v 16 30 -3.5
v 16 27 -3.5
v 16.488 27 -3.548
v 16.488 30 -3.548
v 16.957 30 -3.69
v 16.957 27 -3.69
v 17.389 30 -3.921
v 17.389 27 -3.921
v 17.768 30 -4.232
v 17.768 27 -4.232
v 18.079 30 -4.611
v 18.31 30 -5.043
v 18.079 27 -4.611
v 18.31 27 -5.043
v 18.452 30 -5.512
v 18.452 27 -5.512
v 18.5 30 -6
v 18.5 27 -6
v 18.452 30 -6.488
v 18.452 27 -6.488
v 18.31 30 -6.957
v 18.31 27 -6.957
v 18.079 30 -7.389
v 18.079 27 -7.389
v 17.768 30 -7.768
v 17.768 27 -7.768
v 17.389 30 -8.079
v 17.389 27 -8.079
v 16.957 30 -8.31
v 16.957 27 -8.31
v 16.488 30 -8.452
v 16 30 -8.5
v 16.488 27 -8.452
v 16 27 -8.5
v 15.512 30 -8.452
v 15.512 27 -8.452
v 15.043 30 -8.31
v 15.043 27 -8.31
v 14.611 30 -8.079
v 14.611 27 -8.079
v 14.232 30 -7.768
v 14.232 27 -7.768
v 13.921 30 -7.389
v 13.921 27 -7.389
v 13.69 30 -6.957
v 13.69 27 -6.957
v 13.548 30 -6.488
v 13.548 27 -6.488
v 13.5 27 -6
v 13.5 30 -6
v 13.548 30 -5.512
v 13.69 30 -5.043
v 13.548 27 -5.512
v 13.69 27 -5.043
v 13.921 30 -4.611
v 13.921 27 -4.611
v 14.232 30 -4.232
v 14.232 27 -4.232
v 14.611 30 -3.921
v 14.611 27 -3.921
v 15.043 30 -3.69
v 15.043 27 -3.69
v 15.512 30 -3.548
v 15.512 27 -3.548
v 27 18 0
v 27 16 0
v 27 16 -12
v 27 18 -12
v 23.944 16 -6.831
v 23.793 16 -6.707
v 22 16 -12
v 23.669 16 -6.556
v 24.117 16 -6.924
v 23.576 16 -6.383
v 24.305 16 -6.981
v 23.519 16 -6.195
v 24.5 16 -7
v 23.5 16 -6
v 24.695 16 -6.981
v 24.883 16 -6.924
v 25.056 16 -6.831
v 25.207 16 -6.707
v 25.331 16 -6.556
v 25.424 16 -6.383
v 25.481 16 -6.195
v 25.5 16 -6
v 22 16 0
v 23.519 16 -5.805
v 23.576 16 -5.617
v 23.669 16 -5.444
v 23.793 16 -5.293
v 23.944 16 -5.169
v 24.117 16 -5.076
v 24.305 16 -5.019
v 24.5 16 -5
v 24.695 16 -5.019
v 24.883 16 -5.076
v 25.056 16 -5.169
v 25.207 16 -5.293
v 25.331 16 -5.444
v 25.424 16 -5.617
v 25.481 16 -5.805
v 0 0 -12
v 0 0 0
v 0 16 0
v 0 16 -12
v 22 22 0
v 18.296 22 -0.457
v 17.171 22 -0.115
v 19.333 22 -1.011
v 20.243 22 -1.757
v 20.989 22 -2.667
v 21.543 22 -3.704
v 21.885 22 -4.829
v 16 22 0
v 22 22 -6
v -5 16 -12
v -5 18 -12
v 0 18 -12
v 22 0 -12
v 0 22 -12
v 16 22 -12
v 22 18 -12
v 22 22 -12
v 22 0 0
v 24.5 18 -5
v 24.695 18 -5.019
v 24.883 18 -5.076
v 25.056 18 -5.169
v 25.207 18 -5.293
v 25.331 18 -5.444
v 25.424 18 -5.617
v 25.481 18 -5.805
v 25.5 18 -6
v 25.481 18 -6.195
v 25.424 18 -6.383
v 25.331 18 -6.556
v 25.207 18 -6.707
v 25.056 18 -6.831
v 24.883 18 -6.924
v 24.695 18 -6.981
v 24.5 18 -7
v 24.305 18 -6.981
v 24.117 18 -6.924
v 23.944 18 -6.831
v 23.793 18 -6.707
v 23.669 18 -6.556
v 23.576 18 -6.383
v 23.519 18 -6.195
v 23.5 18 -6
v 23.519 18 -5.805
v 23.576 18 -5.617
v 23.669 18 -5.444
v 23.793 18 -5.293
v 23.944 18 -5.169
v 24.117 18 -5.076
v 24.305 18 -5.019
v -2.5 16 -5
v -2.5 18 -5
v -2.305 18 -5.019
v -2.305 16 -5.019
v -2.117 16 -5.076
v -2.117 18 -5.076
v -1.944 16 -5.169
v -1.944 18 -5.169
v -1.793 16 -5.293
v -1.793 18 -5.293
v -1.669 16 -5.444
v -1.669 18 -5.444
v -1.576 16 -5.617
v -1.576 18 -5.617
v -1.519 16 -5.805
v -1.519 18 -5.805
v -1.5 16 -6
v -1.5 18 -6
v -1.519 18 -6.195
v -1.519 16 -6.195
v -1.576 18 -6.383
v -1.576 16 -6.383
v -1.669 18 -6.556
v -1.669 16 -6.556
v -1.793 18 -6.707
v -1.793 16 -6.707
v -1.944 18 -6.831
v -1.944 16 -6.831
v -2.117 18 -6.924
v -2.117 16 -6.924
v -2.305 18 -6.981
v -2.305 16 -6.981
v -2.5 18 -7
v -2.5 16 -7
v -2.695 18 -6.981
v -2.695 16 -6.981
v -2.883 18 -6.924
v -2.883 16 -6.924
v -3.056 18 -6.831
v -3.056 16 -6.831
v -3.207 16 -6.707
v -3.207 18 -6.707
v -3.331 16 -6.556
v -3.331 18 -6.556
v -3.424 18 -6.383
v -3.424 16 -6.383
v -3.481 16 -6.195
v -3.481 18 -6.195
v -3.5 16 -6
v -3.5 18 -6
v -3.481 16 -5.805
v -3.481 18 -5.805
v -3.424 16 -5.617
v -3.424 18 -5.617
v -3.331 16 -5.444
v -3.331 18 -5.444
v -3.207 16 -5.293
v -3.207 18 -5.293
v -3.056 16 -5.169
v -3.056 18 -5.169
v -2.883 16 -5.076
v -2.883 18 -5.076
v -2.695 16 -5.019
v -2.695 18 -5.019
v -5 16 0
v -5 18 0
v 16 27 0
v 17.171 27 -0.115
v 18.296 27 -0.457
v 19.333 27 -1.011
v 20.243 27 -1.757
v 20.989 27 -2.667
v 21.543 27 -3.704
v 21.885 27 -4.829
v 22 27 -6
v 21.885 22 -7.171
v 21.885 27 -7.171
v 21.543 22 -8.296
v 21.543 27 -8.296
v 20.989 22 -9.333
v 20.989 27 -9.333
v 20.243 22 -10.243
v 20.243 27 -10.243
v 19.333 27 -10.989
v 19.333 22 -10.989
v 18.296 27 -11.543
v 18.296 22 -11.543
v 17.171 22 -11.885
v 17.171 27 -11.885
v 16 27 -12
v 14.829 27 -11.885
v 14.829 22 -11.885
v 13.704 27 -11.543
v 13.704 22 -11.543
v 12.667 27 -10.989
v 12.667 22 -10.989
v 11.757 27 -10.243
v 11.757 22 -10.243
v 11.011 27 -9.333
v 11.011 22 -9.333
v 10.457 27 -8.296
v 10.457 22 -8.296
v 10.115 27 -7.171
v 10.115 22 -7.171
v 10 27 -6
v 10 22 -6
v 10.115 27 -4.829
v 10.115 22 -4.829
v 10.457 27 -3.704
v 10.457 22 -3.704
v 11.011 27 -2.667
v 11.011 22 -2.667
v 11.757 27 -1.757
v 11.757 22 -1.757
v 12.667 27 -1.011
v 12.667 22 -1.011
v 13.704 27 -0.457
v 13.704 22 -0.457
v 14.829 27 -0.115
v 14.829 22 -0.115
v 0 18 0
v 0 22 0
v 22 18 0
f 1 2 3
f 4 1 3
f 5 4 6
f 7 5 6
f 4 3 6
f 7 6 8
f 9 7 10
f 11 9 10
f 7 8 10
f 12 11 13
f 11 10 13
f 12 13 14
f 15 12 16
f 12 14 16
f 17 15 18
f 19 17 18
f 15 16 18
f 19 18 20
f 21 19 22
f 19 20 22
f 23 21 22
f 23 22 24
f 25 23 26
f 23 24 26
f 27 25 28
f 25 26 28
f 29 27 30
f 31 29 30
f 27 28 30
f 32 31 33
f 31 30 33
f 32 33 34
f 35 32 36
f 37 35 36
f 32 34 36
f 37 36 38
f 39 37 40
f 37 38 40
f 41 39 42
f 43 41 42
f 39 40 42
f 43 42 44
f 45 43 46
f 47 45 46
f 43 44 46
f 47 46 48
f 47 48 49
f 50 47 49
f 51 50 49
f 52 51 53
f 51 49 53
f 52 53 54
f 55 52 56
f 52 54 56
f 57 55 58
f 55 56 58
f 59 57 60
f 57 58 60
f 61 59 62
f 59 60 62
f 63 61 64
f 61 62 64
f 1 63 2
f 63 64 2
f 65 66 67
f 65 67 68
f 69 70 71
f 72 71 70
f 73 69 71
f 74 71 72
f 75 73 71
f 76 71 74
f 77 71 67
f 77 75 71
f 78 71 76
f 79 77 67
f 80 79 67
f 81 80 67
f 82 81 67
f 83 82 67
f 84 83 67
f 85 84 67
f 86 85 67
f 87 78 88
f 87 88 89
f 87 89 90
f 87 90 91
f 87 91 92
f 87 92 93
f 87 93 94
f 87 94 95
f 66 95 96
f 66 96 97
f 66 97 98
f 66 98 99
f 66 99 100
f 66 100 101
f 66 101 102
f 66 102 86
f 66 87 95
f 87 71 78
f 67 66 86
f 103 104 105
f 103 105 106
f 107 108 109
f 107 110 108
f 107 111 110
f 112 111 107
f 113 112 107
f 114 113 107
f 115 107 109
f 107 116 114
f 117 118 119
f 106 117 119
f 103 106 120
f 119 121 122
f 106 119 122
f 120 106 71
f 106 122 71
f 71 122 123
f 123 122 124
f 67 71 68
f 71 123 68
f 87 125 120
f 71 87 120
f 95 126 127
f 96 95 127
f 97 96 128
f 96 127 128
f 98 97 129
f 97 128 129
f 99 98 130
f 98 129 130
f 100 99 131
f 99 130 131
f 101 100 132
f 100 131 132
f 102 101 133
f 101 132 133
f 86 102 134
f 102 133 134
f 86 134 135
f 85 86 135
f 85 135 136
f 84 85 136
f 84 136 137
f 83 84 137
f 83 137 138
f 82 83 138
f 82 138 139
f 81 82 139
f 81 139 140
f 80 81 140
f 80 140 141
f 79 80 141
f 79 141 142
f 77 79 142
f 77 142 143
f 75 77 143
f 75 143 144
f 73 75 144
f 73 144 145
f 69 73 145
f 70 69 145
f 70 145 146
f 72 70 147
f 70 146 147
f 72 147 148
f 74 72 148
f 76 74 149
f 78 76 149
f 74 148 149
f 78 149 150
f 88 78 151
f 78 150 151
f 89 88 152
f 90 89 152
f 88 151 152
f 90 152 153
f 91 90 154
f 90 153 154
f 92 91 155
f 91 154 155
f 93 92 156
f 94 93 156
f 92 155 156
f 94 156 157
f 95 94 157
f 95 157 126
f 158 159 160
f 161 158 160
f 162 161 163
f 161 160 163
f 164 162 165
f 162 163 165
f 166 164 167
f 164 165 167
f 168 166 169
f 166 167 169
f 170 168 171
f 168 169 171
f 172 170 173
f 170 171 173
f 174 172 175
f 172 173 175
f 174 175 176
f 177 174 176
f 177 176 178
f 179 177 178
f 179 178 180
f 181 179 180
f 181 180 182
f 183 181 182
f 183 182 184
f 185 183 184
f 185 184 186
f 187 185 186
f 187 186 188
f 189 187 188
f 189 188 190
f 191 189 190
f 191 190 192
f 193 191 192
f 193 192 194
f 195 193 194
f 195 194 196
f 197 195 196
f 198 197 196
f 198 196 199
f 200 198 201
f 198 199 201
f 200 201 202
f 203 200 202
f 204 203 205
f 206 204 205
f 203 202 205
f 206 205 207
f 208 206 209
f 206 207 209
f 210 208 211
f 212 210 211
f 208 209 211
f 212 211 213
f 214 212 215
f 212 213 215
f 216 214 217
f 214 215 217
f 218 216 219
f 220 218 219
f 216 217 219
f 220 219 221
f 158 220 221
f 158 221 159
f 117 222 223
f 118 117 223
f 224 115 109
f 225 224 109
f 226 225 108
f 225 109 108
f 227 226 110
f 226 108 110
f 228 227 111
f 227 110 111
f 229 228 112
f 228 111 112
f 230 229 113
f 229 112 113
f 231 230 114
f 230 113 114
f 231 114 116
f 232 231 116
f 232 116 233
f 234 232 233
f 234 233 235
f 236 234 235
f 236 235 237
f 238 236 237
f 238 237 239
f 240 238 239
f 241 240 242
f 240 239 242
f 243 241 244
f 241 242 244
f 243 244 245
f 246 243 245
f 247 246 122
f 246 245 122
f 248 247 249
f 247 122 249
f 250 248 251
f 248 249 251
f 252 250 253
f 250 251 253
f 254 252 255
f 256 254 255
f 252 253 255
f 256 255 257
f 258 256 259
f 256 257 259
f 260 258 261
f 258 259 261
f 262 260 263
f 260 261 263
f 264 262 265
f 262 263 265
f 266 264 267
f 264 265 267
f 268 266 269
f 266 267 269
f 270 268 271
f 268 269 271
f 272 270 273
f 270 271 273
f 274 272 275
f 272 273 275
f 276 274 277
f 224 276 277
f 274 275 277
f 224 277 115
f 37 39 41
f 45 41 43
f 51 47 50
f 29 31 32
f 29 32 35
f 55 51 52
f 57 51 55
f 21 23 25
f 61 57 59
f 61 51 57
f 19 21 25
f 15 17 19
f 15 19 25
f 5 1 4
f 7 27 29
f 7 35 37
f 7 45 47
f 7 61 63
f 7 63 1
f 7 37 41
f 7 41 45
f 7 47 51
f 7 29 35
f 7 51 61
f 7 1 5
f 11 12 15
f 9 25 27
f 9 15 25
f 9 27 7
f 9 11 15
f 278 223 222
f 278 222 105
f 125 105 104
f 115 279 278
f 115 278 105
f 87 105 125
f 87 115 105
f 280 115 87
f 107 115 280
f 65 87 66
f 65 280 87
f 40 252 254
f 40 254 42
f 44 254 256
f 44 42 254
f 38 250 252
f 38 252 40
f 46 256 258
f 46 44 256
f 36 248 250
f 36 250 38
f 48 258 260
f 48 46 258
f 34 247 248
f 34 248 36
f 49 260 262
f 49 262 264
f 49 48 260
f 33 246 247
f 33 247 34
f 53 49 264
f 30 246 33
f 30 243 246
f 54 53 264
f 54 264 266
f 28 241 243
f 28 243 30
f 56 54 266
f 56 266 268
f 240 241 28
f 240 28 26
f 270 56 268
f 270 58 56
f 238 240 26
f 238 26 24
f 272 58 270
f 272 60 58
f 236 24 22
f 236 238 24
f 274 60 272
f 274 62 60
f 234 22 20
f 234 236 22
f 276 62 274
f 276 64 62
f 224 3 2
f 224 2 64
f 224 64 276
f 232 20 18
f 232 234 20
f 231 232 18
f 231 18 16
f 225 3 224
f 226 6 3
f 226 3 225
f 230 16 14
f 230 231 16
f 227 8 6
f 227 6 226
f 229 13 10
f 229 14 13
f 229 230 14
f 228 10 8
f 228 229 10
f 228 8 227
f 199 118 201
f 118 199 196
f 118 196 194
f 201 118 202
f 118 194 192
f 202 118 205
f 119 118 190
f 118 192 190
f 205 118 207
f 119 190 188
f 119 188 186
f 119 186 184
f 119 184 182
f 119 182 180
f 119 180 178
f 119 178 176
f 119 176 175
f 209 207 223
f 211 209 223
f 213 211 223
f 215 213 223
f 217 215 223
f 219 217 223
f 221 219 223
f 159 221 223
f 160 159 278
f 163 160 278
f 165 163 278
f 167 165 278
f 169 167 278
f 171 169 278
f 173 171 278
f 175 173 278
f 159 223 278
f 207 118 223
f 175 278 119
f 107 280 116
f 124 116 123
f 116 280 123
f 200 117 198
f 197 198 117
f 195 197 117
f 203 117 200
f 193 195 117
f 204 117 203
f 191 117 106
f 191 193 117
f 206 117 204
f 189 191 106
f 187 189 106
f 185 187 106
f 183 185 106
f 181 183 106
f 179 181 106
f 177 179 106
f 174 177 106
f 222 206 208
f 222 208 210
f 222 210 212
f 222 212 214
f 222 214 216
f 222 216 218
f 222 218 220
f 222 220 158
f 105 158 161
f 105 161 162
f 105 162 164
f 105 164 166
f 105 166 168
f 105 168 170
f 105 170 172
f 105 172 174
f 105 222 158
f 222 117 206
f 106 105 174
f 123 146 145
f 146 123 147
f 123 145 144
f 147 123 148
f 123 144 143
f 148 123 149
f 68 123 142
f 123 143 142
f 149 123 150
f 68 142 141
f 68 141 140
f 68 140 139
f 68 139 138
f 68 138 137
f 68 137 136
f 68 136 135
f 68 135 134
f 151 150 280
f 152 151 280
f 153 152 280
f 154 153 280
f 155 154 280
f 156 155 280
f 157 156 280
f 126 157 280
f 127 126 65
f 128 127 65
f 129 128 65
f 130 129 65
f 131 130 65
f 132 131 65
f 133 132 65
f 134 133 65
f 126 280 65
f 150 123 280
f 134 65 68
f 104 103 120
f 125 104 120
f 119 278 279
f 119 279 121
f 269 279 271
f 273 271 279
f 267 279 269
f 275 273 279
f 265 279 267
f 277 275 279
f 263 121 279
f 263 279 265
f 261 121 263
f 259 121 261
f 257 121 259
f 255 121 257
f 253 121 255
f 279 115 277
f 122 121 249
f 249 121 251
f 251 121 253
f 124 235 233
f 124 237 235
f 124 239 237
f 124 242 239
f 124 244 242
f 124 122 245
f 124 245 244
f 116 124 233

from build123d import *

# Parameters (mm, degrees)
SKETCH1_W           = 22
SKETCH1_H           = 12
BOSS_EXTRUDE1_DEPTH = 22
SKETCH2_W           = 32
SKETCH2_H           = 2
BOSS_EXTRUDE2_DEPTH = 12
SKETCH3_R           = 1
CUT_EXTRUDE1_DEPTH  = 22
SKETCH5_R           = 6
BOSS_EXTRUDE3_DEPTH = 5
SKETCH6_R           = 2.5
BOSS_EXTRUDE4_DEPTH = 3


with BuildPart() as part:
    # Sketch1 → Boss-Extrude1 (new body)
    with BuildSketch(Plane(origin=(0, 0, 0), x_dir=(1, 0, 0), z_dir=(0, 1, 0))):
        with Locations((11, 6)):
            Rectangle(SKETCH1_W, SKETCH1_H)
    extrude(amount=BOSS_EXTRUDE1_DEPTH)

    # Sketch2 → Boss-Extrude2 (add, through all)
    with BuildSketch(Plane.XY):
        with Locations((11, 17)):
            Rectangle(SKETCH2_W, SKETCH2_H)
    extrude(amount=-BOSS_EXTRUDE2_DEPTH)

    # Sketch3 → Cut-Extrude1 (cut)
    with BuildSketch(Plane(origin=(0, 18, 0), x_dir=(1, 0, 0), z_dir=(0, 1, 0))):
        with Locations(Location((-2.5, 6, 0), (0, 0, 270))):
            Circle(SKETCH3_R)
        with Locations(Location((24.5, 6, 0), (0, 0, 270))):
            Circle(SKETCH3_R)
    extrude(amount=-CUT_EXTRUDE1_DEPTH, mode=Mode.SUBTRACT)

    # Sketch5 → Boss-Extrude3 (add)
    with BuildSketch(Plane(origin=(0, 22, 0), x_dir=(1, 0, 0), z_dir=(0, 1, 0))):
        with Locations(Location((16, 6, 0), (0, 0, 270))):
            Circle(SKETCH5_R)
    extrude(amount=BOSS_EXTRUDE3_DEPTH)

    # Sketch6 → Boss-Extrude4 (add)
    with BuildSketch(Plane(origin=(0, 27, 0), x_dir=(1, 0, 0), z_dir=(0, 1, 0))):
        with Locations(Location((16, 6, 0), (0, 0, 270))):
            Circle(SKETCH6_R)
    extrude(amount=BOSS_EXTRUDE4_DEPTH)


solid = part.part
